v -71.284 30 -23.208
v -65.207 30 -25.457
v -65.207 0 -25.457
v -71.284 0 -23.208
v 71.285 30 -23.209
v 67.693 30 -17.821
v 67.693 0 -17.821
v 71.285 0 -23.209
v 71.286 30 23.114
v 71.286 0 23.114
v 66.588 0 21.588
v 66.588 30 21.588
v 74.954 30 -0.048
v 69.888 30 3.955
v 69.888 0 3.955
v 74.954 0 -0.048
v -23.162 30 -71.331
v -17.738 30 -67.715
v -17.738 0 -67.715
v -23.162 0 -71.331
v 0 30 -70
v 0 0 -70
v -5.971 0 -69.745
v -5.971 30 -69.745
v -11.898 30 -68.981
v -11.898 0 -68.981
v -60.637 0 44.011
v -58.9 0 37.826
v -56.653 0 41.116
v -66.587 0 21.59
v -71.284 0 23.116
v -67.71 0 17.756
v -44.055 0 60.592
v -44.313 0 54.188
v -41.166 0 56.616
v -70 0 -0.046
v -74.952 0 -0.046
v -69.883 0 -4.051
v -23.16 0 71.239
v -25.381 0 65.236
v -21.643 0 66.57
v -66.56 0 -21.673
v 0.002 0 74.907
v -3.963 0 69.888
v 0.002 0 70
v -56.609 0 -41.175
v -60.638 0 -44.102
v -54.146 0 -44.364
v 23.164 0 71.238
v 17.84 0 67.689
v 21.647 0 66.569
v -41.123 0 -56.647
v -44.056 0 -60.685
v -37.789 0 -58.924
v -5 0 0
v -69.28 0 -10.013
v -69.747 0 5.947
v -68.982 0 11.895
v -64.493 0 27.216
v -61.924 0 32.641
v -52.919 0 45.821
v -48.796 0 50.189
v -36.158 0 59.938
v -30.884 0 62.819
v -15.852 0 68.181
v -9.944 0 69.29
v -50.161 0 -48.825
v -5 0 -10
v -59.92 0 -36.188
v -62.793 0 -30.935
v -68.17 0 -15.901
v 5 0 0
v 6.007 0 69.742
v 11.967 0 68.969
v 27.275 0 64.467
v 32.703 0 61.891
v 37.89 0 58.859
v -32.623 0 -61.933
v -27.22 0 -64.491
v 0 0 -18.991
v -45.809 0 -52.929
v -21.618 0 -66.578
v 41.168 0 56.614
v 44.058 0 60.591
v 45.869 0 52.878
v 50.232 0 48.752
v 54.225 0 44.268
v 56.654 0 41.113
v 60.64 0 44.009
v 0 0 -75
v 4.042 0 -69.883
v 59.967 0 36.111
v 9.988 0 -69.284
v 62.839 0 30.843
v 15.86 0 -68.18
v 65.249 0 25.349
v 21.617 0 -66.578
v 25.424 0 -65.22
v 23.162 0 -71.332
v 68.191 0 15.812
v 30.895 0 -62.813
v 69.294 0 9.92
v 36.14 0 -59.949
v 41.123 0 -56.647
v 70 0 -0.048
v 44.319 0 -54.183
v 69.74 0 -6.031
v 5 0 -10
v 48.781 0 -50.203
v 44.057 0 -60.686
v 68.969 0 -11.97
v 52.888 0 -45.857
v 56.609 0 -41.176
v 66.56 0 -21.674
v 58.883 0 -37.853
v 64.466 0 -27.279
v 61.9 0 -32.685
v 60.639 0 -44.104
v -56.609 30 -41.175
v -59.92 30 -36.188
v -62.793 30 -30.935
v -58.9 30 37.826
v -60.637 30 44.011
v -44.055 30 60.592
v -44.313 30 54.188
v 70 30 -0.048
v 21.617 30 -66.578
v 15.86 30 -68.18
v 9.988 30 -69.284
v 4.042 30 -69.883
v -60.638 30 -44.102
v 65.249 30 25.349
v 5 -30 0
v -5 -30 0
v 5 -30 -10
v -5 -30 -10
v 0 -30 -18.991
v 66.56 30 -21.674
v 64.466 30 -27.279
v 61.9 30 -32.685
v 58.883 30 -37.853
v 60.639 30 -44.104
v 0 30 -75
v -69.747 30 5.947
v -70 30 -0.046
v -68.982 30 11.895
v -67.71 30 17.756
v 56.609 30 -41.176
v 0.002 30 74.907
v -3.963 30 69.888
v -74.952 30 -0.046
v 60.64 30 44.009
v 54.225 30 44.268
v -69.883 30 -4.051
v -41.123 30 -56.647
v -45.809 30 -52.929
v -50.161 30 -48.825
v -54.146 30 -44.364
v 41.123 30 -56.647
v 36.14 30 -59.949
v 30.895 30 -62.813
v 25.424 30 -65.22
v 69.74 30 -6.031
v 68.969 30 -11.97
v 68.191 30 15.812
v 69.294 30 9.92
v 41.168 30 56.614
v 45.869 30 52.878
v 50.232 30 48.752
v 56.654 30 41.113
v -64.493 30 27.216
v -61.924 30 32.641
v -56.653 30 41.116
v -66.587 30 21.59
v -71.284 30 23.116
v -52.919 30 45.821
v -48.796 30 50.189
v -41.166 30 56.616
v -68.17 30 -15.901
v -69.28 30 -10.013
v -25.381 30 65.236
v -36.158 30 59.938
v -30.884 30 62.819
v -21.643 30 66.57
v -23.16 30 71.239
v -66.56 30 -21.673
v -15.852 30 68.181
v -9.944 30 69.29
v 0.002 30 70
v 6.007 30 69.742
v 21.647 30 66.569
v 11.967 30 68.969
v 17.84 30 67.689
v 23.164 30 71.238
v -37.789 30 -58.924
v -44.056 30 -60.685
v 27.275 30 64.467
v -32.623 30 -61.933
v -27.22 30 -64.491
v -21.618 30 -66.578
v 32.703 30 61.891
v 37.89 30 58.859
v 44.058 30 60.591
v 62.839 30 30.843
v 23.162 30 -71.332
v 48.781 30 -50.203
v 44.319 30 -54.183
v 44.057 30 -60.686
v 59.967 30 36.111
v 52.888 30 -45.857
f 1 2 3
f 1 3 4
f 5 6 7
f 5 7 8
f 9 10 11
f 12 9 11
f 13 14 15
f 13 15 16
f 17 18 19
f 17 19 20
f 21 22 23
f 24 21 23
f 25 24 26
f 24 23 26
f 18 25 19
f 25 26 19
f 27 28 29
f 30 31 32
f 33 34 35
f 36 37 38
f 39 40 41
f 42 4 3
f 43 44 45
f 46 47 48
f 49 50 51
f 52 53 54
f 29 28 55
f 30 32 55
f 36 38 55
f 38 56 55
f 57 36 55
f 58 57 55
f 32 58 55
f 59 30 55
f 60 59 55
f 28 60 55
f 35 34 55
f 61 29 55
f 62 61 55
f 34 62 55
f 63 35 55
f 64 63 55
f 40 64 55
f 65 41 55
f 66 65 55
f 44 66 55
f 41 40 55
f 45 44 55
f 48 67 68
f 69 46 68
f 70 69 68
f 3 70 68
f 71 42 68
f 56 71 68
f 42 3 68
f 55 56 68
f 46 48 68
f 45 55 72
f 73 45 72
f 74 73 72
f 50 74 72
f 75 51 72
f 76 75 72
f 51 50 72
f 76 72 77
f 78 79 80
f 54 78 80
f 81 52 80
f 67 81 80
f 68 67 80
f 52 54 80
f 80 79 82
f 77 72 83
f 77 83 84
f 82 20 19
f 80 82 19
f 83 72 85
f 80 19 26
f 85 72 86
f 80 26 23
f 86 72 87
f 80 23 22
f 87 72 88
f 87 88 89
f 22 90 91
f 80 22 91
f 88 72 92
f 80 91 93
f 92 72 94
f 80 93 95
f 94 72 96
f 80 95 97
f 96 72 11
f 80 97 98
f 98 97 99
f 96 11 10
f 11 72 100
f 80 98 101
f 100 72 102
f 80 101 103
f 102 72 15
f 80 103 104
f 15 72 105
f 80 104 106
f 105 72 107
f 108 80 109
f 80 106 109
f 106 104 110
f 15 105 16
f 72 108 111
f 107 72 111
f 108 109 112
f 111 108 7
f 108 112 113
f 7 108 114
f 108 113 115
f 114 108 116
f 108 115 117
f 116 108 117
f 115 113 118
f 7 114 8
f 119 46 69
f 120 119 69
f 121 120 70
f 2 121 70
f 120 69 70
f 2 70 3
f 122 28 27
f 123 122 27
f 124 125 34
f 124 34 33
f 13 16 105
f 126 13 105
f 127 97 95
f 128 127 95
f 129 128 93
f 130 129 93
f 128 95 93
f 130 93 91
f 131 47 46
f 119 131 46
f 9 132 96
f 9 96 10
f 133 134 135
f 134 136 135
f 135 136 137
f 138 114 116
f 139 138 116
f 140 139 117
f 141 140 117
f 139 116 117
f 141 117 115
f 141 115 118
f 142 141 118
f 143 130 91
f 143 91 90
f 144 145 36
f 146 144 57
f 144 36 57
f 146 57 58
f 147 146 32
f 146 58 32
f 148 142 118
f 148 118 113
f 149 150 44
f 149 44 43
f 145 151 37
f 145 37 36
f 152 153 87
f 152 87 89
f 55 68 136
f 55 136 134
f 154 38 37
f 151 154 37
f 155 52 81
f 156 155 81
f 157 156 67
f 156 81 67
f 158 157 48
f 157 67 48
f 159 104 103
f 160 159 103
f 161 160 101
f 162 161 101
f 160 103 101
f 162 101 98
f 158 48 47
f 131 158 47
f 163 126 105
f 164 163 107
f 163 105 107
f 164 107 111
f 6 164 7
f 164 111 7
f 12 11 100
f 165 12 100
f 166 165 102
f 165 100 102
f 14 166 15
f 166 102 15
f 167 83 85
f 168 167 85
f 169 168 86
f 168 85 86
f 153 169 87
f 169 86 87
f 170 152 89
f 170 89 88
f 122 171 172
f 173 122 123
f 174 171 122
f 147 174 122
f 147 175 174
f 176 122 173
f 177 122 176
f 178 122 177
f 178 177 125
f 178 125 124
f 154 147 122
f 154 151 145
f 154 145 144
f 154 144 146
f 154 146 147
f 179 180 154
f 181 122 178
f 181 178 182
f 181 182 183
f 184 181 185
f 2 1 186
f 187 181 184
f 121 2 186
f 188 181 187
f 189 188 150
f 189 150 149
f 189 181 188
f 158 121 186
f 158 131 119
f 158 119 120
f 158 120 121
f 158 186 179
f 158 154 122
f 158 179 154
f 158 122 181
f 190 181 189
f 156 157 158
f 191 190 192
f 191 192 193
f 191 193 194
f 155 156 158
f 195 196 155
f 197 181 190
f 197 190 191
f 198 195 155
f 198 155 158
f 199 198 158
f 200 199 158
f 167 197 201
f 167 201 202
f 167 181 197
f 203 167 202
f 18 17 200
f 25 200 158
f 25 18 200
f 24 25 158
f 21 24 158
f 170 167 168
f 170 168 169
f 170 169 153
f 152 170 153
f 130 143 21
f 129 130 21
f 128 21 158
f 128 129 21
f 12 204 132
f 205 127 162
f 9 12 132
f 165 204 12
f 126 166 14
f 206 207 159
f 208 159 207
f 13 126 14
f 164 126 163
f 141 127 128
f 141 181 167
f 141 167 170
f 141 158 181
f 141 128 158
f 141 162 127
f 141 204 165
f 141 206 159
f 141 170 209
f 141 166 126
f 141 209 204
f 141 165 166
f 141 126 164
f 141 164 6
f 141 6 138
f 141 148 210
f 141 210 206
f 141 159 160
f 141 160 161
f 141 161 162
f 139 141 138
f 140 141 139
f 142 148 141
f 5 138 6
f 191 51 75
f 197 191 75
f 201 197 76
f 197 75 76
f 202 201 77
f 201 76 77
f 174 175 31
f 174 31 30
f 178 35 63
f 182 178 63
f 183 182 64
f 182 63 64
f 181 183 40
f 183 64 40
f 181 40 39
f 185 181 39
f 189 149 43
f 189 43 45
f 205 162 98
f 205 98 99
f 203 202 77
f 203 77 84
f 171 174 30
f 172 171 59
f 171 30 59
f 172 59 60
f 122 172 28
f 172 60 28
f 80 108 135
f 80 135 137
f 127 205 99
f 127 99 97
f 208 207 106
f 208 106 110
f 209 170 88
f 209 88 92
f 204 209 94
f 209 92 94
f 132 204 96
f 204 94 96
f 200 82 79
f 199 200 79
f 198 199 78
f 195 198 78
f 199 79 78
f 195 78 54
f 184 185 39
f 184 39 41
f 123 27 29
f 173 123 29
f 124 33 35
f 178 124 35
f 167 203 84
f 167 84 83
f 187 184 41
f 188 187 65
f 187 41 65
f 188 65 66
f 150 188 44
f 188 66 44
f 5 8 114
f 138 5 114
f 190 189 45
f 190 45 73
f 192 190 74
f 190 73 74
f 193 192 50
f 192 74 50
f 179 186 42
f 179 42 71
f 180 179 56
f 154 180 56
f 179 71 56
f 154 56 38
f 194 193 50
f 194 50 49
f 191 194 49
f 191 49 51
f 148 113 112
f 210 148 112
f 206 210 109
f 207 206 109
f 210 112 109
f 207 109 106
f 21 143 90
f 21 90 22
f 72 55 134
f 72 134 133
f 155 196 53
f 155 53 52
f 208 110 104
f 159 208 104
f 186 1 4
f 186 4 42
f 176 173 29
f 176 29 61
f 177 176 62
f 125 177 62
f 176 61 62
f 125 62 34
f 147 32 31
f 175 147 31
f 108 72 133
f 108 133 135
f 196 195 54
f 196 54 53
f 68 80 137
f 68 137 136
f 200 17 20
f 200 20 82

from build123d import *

# Parameters (mm, degrees)
SKETCH1_R           = 70
BOSS_EXTRUDE1_DEPTH = 30
BOSS_EXTRUDE2_DEPTH = 30
BOSS_EXTRUDE3_DEPTH = 30
CIRPATTERN1_COUNT   = 20


with BuildPart() as part:
    # Sketch1 → Boss-Extrude1 (new body)
    with BuildSketch(Plane(origin=(0, 0, 0), x_dir=(1, 0, 0), z_dir=(0, 1, 0))):
        Circle(SKETCH1_R)
    extrude(amount=BOSS_EXTRUDE1_DEPTH)

    # Sketch2 → Boss-Extrude2 (add)
    with BuildSketch(Plane(origin=(0, 0, 0), x_dir=(1, 0, 0), z_dir=(0, 1, 0))):
        Polygon((-5, 0), (5, 0), (5, 10), (0, 18.9908378), (-5, 10), align=None)
    extrude(amount=-BOSS_EXTRUDE2_DEPTH)

    # Sketch3 → Boss-Extrude3 (add)
    with BuildSketch(Plane(origin=(0, 30, 0), x_dir=(1, 0, 0), z_dir=(0, 1, 0))):
        with BuildLine():
            Line((0, 75), (0, 70))
            ThreePointArc((0, 70), (2.021982695, 69.970790949), (4.042277957, 69.883188171))
            Line((4.042277957, 69.883188171), (0, 75))
        make_face()
    boss_extrude3 = extrude(amount=-BOSS_EXTRUDE3_DEPTH)

    # CirPattern1: Boss-Extrude3 ×20 about axis
    cirpattern1_axis = Axis((0.000873645, 0, -0.046633798), (0, 1, 0))
    for i in range(1, CIRPATTERN1_COUNT):
        add(boss_extrude3.rotate(cirpattern1_axis, i * 360 / CIRPATTERN1_COUNT))


solid = part.part
